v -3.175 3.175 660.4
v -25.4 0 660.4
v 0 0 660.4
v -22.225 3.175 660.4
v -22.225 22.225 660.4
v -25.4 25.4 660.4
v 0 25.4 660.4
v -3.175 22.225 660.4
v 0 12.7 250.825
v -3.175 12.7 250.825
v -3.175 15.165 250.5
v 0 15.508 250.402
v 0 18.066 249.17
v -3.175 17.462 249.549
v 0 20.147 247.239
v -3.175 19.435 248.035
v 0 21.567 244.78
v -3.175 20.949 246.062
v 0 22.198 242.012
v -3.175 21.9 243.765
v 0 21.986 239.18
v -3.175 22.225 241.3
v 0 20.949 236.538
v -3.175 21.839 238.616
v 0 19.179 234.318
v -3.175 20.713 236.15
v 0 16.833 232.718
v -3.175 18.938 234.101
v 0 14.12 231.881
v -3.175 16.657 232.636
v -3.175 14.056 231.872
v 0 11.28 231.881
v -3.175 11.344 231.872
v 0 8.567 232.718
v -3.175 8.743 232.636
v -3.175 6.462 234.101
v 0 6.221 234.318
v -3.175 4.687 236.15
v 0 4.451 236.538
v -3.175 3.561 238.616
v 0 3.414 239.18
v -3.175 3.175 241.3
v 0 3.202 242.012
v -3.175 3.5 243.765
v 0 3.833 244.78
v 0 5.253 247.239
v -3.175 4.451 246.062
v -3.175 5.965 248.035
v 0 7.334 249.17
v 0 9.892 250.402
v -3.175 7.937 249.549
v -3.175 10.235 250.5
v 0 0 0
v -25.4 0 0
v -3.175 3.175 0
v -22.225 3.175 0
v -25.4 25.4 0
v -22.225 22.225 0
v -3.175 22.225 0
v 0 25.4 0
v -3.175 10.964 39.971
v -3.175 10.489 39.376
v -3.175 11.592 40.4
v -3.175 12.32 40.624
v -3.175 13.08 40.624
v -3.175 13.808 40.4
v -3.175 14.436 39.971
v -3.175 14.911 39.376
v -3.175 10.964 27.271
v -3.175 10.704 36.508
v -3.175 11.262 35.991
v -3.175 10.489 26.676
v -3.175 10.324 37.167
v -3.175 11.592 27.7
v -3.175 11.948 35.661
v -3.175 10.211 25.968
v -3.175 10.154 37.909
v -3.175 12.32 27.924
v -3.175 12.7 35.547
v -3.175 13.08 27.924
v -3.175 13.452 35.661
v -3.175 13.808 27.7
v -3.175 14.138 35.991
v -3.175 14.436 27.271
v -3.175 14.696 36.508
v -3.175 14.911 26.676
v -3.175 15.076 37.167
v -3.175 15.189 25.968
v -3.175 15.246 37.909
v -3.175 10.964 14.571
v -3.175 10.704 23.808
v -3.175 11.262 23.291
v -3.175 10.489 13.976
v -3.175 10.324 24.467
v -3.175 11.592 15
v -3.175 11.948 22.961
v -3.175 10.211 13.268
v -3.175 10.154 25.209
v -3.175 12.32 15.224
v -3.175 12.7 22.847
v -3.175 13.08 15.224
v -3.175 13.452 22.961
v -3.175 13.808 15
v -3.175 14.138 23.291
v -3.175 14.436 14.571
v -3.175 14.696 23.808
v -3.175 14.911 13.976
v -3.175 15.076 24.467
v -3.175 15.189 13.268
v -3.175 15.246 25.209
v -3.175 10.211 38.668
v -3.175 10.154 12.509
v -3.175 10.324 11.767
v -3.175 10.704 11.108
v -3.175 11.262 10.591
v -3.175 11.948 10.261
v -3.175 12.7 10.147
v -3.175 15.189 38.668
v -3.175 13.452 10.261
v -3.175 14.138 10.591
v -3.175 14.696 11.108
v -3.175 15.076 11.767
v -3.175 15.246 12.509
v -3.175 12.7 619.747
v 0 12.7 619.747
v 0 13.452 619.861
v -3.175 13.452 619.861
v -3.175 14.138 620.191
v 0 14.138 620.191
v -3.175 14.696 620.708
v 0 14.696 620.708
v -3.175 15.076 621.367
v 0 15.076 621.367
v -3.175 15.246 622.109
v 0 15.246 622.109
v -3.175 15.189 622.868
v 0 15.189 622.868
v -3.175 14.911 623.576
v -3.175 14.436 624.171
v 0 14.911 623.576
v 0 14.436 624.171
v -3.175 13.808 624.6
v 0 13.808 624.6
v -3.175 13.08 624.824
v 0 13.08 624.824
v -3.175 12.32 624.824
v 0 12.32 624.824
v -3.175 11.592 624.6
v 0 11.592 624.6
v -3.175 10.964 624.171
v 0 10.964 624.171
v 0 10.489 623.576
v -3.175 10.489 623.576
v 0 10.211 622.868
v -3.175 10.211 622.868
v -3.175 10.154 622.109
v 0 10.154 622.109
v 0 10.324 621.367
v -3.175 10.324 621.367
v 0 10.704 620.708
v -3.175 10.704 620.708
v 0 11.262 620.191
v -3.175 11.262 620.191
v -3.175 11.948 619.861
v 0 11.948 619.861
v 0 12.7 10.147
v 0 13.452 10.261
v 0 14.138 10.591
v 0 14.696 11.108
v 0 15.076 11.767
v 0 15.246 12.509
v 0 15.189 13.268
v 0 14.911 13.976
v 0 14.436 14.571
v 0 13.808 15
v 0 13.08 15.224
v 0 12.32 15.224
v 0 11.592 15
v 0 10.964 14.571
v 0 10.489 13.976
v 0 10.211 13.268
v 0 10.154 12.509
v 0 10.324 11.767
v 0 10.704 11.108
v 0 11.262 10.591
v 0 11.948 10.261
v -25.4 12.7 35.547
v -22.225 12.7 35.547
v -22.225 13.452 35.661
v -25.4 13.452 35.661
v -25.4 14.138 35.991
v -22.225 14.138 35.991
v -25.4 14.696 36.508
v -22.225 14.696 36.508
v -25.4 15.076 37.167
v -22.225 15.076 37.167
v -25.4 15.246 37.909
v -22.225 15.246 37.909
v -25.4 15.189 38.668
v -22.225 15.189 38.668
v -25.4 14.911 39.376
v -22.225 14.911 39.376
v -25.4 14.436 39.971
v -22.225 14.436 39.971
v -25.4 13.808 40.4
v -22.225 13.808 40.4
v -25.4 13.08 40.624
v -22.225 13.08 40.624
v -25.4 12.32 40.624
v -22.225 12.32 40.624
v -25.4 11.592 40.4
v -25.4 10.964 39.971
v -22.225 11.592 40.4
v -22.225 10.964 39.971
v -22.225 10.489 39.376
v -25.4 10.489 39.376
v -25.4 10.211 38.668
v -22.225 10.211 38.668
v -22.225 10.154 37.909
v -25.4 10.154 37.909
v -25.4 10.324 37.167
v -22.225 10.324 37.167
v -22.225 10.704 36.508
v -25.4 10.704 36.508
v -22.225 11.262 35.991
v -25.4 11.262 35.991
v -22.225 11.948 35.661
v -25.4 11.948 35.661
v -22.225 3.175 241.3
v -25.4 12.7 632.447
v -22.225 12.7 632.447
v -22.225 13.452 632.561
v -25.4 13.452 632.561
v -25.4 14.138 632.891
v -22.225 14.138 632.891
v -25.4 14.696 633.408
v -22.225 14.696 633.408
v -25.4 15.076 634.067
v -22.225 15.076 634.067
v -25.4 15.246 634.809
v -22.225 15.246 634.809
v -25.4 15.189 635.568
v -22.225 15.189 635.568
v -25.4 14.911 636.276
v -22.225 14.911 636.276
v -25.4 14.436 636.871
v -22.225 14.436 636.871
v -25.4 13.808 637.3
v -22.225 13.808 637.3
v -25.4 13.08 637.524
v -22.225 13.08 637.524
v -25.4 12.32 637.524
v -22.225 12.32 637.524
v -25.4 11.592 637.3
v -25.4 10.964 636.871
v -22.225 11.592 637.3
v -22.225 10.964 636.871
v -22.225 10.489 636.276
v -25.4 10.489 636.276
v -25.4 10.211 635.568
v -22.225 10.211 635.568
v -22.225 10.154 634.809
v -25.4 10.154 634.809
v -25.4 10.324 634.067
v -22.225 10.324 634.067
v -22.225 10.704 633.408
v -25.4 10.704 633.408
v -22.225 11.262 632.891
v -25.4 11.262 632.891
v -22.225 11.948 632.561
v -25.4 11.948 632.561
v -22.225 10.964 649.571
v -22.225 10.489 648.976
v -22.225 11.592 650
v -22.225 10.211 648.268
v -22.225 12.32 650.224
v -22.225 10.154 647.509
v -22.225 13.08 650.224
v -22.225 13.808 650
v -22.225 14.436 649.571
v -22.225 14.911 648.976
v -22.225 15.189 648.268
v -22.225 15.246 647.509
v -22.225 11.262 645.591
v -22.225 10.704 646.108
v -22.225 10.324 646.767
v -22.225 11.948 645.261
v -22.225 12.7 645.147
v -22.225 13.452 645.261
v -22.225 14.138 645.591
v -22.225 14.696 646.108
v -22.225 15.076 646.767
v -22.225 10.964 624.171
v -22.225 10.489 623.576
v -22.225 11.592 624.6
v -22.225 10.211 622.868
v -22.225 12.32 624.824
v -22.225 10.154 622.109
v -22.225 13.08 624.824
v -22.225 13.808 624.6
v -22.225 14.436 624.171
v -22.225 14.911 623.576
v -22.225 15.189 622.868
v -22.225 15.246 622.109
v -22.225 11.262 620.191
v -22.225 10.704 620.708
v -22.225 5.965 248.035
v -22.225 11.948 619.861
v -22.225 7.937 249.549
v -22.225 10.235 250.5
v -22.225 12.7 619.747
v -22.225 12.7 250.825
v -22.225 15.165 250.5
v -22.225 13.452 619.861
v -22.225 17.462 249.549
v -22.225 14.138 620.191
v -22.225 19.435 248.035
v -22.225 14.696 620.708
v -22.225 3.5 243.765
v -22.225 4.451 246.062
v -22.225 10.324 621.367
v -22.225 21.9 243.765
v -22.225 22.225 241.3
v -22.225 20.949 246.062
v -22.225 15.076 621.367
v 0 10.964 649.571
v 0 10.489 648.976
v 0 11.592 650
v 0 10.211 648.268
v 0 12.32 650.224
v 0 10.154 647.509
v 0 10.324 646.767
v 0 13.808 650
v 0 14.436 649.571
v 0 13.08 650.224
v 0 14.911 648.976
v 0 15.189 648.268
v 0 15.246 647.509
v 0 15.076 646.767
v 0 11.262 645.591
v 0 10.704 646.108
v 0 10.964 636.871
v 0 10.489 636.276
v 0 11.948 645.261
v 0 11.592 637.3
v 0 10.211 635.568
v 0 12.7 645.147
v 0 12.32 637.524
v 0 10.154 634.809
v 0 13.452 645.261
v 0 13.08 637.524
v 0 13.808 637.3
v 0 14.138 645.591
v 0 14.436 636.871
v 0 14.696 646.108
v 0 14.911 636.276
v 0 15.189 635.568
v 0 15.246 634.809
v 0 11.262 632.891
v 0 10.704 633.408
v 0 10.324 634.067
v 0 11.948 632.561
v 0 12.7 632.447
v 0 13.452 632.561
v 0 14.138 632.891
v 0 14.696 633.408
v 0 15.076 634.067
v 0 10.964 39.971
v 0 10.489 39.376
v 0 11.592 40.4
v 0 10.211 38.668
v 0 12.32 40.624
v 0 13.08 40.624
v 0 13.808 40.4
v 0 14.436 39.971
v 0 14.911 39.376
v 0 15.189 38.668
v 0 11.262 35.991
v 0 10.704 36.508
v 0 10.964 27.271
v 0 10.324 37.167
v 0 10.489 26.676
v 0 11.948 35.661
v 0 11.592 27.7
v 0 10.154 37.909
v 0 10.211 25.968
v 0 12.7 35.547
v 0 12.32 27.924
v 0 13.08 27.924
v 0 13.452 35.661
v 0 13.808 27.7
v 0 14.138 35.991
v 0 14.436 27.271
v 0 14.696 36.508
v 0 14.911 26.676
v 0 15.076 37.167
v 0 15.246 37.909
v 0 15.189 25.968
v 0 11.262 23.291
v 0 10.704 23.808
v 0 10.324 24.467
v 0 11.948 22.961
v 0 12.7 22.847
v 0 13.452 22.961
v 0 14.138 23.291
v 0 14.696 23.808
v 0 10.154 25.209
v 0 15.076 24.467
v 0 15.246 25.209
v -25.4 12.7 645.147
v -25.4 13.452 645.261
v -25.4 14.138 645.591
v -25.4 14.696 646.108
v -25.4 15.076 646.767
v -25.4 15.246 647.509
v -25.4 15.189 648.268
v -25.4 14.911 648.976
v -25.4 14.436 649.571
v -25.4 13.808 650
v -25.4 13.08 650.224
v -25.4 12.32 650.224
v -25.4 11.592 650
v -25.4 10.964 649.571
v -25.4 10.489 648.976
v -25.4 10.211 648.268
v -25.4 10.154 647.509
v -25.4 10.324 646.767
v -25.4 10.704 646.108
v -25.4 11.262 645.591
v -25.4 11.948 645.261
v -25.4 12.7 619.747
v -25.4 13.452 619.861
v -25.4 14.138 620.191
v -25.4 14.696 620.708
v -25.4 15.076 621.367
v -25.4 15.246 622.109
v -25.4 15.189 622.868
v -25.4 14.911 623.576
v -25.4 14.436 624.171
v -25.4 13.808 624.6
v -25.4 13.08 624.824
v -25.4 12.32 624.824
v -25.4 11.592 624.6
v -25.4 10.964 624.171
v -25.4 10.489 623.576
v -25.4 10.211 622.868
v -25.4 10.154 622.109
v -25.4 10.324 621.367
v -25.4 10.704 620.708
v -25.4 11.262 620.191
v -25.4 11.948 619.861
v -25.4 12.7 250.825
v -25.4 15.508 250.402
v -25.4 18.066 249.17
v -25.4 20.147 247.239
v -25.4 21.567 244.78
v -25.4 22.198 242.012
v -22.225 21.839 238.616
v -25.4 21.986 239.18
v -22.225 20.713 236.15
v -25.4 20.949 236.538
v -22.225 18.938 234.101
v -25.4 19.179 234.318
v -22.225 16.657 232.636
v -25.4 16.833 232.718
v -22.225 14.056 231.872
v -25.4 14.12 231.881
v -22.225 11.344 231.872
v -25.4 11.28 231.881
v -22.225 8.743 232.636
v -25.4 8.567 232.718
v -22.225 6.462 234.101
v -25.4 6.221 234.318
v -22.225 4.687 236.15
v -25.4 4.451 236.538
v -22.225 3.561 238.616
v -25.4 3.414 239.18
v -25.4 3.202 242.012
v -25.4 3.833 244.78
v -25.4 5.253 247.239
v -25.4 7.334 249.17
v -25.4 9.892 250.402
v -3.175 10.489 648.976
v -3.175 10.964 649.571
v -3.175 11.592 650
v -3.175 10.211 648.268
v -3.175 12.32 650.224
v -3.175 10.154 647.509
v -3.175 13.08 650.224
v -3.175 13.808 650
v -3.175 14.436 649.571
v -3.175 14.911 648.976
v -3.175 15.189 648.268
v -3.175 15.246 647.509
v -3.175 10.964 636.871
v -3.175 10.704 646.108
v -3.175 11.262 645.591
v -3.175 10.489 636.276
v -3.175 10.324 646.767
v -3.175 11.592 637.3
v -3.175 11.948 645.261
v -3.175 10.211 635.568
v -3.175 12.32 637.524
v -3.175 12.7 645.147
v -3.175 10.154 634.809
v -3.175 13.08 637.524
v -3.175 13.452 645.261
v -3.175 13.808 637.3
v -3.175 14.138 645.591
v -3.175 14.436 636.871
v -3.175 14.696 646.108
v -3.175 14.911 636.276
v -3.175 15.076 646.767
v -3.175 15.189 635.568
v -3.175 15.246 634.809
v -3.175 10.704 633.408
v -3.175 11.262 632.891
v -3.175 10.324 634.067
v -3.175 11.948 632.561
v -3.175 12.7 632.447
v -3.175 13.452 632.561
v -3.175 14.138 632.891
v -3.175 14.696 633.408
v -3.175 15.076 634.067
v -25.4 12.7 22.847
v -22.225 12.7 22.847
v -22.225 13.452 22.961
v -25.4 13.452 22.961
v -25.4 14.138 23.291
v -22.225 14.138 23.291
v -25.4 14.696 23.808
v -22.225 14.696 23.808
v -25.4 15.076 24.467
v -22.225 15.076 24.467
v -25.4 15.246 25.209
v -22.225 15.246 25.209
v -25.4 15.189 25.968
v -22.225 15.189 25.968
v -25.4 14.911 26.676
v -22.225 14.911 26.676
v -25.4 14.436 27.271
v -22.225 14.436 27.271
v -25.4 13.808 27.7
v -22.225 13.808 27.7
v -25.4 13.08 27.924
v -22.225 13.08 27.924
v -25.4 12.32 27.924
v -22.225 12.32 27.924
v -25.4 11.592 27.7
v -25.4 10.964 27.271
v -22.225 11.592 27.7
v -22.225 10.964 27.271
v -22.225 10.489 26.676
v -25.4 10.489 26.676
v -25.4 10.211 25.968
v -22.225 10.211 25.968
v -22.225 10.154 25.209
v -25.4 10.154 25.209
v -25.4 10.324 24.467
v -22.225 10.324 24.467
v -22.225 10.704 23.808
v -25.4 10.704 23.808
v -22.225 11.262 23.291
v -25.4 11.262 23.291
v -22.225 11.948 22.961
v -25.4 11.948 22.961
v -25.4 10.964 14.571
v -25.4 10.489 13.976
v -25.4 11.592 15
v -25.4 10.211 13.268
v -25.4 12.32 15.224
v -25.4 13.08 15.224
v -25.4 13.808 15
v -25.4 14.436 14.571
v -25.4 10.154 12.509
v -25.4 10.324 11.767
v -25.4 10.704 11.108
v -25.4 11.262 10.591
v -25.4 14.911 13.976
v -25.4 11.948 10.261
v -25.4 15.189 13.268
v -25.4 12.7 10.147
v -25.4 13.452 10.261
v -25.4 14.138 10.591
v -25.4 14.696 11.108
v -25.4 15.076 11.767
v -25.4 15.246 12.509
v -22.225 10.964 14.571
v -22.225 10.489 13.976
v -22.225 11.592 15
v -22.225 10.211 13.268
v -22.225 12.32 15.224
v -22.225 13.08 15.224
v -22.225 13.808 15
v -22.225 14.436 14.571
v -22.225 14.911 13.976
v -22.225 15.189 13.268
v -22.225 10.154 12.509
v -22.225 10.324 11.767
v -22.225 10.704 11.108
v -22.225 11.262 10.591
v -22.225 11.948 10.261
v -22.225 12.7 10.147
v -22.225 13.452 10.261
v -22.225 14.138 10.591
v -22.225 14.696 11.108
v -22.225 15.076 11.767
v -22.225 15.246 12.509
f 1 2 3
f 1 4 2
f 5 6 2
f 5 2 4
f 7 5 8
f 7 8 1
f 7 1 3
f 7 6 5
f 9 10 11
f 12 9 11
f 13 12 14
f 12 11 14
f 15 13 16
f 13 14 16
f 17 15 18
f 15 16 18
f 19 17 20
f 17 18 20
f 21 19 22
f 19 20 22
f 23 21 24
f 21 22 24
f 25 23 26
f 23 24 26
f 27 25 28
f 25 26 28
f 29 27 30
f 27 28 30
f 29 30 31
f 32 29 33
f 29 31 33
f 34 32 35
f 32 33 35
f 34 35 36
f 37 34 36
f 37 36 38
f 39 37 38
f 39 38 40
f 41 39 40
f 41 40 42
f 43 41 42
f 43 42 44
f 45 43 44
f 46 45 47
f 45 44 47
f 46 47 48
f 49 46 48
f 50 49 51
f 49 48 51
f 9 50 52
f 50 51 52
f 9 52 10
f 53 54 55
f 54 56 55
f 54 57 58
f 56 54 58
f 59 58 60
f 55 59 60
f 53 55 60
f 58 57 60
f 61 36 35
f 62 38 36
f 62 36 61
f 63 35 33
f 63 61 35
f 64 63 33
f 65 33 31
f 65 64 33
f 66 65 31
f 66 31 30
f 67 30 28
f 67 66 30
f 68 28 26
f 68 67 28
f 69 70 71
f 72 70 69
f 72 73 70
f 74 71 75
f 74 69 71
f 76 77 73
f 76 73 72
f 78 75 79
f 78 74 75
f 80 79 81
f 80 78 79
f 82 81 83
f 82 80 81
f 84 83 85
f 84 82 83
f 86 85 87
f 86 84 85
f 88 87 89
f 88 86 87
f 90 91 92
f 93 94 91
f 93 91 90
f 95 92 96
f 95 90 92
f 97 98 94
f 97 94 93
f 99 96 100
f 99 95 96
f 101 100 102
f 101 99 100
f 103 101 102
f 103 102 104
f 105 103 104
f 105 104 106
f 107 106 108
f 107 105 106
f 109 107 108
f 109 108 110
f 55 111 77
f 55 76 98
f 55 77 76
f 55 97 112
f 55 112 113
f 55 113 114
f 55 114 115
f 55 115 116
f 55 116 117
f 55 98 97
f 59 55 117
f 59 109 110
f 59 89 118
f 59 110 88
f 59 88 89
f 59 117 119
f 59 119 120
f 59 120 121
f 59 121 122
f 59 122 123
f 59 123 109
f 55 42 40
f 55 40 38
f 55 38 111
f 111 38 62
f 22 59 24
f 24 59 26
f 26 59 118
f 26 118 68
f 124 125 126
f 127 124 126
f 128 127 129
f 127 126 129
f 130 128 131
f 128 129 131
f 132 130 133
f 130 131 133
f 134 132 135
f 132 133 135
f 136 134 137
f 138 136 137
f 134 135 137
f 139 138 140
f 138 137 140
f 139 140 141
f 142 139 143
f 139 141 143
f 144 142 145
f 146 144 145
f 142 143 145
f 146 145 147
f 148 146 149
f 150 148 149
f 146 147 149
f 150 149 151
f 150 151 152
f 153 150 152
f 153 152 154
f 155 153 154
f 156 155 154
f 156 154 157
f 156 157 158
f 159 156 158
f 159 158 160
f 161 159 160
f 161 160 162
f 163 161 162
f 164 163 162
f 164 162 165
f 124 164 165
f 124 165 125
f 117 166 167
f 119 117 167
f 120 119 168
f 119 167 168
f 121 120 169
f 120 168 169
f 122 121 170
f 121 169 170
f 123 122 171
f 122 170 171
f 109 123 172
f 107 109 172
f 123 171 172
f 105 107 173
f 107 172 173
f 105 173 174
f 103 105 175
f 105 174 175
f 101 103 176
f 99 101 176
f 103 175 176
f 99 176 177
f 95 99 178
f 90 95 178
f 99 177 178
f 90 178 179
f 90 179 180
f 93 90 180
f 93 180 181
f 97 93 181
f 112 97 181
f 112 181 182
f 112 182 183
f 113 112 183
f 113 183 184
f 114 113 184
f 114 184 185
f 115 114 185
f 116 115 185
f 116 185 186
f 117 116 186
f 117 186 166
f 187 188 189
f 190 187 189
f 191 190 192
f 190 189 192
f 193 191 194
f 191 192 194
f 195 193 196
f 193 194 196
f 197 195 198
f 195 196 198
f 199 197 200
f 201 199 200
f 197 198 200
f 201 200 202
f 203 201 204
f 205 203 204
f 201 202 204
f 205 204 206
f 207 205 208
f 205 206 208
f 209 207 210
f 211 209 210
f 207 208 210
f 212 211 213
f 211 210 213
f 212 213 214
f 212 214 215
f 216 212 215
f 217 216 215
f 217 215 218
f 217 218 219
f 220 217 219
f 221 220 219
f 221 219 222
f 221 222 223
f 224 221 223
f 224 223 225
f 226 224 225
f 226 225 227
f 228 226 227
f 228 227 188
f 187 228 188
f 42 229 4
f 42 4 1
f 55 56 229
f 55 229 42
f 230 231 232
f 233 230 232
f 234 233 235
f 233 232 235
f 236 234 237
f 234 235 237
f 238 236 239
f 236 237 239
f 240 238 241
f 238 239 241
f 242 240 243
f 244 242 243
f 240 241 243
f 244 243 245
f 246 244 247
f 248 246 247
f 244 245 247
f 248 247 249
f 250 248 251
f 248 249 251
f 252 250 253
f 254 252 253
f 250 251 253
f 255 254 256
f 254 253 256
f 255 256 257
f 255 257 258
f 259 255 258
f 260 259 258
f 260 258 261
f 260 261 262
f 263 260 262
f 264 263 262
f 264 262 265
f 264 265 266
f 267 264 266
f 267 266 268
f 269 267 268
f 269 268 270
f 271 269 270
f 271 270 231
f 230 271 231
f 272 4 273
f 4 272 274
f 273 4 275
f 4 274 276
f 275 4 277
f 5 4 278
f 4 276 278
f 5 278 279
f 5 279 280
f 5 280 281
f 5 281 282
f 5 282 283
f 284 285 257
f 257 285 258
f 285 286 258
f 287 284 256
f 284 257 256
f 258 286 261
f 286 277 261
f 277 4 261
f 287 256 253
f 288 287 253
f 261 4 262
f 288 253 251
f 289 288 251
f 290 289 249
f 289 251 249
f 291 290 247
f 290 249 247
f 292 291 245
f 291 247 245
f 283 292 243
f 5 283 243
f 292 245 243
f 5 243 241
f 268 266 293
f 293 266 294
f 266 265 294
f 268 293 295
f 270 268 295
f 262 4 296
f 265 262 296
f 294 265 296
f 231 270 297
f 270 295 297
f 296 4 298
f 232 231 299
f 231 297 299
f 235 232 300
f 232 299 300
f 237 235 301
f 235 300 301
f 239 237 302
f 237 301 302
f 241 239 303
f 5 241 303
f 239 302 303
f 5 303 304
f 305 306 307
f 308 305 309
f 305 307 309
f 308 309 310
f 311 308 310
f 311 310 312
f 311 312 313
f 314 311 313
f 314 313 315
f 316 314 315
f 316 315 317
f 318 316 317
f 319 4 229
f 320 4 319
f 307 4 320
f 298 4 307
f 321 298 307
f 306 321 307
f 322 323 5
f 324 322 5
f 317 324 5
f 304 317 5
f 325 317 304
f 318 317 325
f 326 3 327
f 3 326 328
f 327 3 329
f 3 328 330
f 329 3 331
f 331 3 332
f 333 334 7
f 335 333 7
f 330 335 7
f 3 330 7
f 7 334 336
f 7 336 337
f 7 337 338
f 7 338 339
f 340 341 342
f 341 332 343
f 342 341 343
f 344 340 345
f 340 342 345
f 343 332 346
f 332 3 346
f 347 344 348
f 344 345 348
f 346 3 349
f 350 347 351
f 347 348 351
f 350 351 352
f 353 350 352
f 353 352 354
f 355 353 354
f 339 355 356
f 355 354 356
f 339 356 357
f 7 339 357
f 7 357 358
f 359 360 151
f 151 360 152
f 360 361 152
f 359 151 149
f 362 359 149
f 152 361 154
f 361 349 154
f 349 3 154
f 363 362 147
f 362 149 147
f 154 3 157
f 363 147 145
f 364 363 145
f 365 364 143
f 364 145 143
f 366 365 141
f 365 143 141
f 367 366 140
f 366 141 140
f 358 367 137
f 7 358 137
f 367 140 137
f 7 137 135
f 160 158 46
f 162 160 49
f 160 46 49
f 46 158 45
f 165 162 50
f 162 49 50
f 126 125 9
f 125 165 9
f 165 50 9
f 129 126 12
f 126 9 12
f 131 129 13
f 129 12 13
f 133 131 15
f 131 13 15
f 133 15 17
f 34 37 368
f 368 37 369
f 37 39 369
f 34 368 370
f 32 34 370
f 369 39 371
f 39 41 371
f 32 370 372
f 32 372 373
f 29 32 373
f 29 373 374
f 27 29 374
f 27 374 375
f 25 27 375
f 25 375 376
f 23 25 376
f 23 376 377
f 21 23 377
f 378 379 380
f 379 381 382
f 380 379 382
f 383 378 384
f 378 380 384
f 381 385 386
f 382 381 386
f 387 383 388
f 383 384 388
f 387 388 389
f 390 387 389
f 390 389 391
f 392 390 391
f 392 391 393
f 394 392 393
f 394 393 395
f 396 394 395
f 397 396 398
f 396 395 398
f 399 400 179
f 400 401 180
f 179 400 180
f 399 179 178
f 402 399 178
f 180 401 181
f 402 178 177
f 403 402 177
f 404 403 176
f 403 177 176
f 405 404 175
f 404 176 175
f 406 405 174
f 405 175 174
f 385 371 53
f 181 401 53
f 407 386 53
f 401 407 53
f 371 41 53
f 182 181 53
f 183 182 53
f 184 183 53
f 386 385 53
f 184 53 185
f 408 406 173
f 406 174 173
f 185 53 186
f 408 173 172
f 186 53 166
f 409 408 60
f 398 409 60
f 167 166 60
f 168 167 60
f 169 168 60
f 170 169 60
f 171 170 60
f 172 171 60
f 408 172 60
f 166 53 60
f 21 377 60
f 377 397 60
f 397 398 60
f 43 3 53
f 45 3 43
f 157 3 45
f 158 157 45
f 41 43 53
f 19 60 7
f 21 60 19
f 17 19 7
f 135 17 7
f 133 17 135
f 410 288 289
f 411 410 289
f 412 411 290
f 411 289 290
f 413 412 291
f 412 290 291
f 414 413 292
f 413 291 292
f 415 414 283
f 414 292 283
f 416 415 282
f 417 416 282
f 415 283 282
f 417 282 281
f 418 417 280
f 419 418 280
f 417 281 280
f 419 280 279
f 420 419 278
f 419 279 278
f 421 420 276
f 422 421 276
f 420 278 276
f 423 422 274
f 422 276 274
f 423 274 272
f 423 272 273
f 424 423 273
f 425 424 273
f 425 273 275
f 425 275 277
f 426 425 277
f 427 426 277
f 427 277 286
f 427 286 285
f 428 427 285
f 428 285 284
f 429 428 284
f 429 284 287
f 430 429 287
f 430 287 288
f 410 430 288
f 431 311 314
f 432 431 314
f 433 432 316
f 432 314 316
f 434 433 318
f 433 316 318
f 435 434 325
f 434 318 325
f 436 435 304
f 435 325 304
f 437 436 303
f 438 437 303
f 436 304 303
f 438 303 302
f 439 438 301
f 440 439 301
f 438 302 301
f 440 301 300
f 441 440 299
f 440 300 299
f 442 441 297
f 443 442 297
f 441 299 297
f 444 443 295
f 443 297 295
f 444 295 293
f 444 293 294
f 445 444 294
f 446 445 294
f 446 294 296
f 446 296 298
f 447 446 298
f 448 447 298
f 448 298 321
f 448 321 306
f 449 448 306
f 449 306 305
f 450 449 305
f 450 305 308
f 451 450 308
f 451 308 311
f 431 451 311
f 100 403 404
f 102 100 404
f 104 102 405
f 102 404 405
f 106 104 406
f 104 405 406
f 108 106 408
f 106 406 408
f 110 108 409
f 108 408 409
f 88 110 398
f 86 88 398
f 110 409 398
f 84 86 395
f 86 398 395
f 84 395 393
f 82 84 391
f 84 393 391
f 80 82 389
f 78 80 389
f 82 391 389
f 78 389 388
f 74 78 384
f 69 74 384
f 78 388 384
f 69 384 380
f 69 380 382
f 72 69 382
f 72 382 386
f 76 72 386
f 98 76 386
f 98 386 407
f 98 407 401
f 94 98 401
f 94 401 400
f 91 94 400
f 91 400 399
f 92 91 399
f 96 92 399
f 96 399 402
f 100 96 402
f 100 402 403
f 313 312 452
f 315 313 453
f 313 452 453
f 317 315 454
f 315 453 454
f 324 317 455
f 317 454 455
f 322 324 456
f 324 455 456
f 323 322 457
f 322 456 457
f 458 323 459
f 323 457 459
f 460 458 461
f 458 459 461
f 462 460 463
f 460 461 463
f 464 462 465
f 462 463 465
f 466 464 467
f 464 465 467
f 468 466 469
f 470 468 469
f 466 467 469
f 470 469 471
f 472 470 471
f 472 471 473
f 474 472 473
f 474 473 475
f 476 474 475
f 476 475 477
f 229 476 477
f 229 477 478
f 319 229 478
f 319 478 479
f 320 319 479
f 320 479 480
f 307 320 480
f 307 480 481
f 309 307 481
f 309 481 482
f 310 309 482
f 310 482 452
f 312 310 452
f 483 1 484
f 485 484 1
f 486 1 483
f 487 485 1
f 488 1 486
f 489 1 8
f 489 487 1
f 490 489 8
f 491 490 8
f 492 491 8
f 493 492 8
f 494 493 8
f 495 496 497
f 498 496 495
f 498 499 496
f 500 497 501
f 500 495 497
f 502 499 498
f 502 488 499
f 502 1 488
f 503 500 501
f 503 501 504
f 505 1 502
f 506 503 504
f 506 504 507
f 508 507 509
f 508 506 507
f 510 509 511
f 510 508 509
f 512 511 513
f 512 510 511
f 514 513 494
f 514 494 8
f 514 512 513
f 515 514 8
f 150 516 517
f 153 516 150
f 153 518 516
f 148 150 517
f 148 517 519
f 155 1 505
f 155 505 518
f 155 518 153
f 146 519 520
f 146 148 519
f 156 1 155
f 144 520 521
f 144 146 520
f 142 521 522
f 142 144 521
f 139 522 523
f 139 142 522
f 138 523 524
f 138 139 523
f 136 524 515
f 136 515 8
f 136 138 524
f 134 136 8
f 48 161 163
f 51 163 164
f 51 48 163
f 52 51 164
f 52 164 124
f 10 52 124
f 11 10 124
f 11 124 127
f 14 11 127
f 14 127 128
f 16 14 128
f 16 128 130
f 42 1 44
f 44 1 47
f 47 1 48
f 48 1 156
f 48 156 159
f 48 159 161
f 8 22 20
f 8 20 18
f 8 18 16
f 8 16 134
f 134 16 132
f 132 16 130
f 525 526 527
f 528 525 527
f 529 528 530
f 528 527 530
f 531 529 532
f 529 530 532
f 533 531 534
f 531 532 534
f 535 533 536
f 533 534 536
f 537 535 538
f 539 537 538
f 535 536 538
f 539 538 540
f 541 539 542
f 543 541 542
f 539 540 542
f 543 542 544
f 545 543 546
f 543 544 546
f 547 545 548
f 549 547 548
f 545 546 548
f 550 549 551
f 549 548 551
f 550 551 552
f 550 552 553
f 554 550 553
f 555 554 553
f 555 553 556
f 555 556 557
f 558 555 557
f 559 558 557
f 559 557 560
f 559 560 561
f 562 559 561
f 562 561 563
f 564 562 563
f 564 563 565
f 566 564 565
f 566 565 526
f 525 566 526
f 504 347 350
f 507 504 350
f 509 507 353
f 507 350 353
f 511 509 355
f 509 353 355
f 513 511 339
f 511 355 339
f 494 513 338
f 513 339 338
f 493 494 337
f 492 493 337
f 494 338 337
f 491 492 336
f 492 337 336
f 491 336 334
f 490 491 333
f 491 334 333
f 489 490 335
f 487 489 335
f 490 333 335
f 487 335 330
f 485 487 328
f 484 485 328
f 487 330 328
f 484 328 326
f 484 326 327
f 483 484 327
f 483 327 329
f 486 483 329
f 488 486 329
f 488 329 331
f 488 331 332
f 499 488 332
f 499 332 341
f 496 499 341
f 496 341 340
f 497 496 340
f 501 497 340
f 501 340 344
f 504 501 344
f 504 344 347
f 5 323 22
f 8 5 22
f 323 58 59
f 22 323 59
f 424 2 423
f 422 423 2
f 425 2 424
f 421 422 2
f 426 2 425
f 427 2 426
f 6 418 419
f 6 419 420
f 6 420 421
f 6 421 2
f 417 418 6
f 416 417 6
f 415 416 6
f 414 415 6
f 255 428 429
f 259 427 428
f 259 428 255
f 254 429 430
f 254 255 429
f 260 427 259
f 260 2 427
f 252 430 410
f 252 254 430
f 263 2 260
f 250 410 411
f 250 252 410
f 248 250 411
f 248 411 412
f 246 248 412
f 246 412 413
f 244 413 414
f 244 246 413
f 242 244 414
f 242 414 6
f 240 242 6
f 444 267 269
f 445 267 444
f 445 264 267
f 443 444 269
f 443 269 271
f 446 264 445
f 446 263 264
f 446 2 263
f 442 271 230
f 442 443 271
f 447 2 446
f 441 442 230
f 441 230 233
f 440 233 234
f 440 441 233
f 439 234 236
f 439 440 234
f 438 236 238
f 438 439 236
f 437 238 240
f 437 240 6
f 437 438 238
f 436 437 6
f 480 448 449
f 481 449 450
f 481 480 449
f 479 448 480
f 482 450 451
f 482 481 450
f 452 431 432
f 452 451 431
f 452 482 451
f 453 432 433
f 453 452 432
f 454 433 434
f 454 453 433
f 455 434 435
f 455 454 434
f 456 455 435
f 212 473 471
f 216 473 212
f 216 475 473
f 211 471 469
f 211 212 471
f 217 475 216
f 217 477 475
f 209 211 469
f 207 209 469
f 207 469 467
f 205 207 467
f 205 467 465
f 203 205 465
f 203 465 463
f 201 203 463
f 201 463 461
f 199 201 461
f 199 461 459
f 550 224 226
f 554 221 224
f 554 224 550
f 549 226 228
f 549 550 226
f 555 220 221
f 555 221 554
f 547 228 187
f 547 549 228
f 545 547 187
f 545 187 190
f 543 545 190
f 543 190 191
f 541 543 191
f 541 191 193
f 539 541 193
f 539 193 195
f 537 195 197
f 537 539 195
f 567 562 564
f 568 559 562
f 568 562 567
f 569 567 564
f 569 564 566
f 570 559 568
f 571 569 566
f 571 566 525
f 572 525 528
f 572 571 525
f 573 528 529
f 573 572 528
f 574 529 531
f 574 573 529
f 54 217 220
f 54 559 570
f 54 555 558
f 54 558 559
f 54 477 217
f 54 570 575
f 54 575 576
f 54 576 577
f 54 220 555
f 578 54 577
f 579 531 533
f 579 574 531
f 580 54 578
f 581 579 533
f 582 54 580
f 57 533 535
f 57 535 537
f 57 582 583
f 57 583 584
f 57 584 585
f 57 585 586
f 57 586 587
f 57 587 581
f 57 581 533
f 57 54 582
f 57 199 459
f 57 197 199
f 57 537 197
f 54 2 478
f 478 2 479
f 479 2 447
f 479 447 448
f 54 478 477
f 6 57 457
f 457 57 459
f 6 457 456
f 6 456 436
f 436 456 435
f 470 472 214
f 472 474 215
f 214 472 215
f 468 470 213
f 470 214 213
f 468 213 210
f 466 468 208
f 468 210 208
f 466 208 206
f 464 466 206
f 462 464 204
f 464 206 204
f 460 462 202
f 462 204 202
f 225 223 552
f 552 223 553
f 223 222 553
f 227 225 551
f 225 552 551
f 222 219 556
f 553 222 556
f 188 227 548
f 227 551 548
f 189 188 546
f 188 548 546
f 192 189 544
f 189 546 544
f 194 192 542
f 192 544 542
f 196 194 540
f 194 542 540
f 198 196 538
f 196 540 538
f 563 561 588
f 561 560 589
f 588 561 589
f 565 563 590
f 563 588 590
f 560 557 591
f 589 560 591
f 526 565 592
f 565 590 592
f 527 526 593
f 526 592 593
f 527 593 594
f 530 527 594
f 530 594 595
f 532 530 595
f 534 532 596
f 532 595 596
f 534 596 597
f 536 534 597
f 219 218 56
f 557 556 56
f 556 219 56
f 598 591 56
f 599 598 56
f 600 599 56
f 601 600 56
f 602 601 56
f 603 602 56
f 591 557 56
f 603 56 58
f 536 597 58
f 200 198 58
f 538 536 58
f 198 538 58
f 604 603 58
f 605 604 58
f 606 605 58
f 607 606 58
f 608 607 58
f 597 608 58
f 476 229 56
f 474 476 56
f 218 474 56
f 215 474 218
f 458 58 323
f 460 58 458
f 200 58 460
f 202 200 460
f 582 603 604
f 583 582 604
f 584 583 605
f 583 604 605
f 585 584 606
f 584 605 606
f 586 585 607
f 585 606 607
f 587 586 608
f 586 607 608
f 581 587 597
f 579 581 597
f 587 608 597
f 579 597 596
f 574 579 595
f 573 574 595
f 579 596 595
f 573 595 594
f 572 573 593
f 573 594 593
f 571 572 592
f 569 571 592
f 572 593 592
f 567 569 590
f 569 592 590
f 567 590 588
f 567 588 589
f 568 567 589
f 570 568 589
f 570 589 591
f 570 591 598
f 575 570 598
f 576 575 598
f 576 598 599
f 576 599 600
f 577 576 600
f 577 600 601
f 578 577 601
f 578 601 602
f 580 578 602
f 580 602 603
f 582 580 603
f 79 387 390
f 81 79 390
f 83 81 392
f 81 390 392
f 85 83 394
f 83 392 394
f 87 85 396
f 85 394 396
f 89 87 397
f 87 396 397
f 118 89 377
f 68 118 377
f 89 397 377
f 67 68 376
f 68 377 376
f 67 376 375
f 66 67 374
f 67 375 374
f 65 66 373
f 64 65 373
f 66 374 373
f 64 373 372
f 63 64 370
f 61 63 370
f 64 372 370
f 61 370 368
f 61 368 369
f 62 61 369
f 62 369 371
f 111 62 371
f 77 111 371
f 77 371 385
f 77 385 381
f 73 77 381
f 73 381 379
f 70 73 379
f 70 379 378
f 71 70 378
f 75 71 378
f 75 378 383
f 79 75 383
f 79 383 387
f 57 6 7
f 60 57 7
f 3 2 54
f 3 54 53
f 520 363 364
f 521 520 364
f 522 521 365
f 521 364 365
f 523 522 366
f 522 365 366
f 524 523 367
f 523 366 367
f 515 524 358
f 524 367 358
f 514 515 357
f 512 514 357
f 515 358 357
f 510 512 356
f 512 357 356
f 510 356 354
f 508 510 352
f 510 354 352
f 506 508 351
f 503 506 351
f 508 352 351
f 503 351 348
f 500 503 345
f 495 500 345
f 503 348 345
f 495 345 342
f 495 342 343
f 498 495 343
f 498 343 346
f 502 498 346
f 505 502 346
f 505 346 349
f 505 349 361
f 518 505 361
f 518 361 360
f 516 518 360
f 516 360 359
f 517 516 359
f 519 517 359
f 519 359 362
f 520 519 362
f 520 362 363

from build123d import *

# Parameters (mm, degrees)
SKETCH1_W              = 25.4
SKETCH1_H              = 25.4
SKETCH1_W_2            = 19.05
SKETCH1_H_2            = 19.05
EXTRUDE_THIN1_DEPTH    = 660.4
SKETCH4_R              = 9.525
CUT_EXTRUDE1_DEPTH     = 662.376201568
F_10_CLEARANCE_HOLE2_D = 5.1054
F_10_CLEARANCE_HOLE3_D = 5.1054


with BuildPart() as part:
    # Sketch1 → Extrude-Thin1 (new body)
    with BuildSketch(Plane.XY):
        with Locations((-12.7, 12.7)):
            Rectangle(SKETCH1_W, SKETCH1_H)
        with Locations((-12.7, 12.7)):
            Rectangle(SKETCH1_W_2, SKETCH1_H_2, mode=Mode.SUBTRACT)
    extrude(amount=EXTRUDE_THIN1_DEPTH)

    # Sketch4 → Cut-Extrude1 (cut, through all)
    with BuildSketch(Plane.ZY.offset(25.4)):
        with Locations((241.3, 12.7)):
            Circle(SKETCH4_R)
    extrude(amount=-CUT_EXTRUDE1_DEPTH, mode=Mode.SUBTRACT)

    # #10 Clearance Hole2 (through all)
    with Locations(Plane.ZY.offset(25.4)):
        with Locations((12.7, 12.7), (25.4, 12.7), (38.1, 12.7)):
            Hole(F_10_CLEARANCE_HOLE2_D / 2)

    # #10 Clearance Hole3 (through all)
    with Locations(Plane.ZY.offset(25.4)):
        with Locations((622.3, 12.7), (635, 12.7), (647.7, 12.7)):
            Hole(F_10_CLEARANCE_HOLE3_D / 2)


solid = part.part
